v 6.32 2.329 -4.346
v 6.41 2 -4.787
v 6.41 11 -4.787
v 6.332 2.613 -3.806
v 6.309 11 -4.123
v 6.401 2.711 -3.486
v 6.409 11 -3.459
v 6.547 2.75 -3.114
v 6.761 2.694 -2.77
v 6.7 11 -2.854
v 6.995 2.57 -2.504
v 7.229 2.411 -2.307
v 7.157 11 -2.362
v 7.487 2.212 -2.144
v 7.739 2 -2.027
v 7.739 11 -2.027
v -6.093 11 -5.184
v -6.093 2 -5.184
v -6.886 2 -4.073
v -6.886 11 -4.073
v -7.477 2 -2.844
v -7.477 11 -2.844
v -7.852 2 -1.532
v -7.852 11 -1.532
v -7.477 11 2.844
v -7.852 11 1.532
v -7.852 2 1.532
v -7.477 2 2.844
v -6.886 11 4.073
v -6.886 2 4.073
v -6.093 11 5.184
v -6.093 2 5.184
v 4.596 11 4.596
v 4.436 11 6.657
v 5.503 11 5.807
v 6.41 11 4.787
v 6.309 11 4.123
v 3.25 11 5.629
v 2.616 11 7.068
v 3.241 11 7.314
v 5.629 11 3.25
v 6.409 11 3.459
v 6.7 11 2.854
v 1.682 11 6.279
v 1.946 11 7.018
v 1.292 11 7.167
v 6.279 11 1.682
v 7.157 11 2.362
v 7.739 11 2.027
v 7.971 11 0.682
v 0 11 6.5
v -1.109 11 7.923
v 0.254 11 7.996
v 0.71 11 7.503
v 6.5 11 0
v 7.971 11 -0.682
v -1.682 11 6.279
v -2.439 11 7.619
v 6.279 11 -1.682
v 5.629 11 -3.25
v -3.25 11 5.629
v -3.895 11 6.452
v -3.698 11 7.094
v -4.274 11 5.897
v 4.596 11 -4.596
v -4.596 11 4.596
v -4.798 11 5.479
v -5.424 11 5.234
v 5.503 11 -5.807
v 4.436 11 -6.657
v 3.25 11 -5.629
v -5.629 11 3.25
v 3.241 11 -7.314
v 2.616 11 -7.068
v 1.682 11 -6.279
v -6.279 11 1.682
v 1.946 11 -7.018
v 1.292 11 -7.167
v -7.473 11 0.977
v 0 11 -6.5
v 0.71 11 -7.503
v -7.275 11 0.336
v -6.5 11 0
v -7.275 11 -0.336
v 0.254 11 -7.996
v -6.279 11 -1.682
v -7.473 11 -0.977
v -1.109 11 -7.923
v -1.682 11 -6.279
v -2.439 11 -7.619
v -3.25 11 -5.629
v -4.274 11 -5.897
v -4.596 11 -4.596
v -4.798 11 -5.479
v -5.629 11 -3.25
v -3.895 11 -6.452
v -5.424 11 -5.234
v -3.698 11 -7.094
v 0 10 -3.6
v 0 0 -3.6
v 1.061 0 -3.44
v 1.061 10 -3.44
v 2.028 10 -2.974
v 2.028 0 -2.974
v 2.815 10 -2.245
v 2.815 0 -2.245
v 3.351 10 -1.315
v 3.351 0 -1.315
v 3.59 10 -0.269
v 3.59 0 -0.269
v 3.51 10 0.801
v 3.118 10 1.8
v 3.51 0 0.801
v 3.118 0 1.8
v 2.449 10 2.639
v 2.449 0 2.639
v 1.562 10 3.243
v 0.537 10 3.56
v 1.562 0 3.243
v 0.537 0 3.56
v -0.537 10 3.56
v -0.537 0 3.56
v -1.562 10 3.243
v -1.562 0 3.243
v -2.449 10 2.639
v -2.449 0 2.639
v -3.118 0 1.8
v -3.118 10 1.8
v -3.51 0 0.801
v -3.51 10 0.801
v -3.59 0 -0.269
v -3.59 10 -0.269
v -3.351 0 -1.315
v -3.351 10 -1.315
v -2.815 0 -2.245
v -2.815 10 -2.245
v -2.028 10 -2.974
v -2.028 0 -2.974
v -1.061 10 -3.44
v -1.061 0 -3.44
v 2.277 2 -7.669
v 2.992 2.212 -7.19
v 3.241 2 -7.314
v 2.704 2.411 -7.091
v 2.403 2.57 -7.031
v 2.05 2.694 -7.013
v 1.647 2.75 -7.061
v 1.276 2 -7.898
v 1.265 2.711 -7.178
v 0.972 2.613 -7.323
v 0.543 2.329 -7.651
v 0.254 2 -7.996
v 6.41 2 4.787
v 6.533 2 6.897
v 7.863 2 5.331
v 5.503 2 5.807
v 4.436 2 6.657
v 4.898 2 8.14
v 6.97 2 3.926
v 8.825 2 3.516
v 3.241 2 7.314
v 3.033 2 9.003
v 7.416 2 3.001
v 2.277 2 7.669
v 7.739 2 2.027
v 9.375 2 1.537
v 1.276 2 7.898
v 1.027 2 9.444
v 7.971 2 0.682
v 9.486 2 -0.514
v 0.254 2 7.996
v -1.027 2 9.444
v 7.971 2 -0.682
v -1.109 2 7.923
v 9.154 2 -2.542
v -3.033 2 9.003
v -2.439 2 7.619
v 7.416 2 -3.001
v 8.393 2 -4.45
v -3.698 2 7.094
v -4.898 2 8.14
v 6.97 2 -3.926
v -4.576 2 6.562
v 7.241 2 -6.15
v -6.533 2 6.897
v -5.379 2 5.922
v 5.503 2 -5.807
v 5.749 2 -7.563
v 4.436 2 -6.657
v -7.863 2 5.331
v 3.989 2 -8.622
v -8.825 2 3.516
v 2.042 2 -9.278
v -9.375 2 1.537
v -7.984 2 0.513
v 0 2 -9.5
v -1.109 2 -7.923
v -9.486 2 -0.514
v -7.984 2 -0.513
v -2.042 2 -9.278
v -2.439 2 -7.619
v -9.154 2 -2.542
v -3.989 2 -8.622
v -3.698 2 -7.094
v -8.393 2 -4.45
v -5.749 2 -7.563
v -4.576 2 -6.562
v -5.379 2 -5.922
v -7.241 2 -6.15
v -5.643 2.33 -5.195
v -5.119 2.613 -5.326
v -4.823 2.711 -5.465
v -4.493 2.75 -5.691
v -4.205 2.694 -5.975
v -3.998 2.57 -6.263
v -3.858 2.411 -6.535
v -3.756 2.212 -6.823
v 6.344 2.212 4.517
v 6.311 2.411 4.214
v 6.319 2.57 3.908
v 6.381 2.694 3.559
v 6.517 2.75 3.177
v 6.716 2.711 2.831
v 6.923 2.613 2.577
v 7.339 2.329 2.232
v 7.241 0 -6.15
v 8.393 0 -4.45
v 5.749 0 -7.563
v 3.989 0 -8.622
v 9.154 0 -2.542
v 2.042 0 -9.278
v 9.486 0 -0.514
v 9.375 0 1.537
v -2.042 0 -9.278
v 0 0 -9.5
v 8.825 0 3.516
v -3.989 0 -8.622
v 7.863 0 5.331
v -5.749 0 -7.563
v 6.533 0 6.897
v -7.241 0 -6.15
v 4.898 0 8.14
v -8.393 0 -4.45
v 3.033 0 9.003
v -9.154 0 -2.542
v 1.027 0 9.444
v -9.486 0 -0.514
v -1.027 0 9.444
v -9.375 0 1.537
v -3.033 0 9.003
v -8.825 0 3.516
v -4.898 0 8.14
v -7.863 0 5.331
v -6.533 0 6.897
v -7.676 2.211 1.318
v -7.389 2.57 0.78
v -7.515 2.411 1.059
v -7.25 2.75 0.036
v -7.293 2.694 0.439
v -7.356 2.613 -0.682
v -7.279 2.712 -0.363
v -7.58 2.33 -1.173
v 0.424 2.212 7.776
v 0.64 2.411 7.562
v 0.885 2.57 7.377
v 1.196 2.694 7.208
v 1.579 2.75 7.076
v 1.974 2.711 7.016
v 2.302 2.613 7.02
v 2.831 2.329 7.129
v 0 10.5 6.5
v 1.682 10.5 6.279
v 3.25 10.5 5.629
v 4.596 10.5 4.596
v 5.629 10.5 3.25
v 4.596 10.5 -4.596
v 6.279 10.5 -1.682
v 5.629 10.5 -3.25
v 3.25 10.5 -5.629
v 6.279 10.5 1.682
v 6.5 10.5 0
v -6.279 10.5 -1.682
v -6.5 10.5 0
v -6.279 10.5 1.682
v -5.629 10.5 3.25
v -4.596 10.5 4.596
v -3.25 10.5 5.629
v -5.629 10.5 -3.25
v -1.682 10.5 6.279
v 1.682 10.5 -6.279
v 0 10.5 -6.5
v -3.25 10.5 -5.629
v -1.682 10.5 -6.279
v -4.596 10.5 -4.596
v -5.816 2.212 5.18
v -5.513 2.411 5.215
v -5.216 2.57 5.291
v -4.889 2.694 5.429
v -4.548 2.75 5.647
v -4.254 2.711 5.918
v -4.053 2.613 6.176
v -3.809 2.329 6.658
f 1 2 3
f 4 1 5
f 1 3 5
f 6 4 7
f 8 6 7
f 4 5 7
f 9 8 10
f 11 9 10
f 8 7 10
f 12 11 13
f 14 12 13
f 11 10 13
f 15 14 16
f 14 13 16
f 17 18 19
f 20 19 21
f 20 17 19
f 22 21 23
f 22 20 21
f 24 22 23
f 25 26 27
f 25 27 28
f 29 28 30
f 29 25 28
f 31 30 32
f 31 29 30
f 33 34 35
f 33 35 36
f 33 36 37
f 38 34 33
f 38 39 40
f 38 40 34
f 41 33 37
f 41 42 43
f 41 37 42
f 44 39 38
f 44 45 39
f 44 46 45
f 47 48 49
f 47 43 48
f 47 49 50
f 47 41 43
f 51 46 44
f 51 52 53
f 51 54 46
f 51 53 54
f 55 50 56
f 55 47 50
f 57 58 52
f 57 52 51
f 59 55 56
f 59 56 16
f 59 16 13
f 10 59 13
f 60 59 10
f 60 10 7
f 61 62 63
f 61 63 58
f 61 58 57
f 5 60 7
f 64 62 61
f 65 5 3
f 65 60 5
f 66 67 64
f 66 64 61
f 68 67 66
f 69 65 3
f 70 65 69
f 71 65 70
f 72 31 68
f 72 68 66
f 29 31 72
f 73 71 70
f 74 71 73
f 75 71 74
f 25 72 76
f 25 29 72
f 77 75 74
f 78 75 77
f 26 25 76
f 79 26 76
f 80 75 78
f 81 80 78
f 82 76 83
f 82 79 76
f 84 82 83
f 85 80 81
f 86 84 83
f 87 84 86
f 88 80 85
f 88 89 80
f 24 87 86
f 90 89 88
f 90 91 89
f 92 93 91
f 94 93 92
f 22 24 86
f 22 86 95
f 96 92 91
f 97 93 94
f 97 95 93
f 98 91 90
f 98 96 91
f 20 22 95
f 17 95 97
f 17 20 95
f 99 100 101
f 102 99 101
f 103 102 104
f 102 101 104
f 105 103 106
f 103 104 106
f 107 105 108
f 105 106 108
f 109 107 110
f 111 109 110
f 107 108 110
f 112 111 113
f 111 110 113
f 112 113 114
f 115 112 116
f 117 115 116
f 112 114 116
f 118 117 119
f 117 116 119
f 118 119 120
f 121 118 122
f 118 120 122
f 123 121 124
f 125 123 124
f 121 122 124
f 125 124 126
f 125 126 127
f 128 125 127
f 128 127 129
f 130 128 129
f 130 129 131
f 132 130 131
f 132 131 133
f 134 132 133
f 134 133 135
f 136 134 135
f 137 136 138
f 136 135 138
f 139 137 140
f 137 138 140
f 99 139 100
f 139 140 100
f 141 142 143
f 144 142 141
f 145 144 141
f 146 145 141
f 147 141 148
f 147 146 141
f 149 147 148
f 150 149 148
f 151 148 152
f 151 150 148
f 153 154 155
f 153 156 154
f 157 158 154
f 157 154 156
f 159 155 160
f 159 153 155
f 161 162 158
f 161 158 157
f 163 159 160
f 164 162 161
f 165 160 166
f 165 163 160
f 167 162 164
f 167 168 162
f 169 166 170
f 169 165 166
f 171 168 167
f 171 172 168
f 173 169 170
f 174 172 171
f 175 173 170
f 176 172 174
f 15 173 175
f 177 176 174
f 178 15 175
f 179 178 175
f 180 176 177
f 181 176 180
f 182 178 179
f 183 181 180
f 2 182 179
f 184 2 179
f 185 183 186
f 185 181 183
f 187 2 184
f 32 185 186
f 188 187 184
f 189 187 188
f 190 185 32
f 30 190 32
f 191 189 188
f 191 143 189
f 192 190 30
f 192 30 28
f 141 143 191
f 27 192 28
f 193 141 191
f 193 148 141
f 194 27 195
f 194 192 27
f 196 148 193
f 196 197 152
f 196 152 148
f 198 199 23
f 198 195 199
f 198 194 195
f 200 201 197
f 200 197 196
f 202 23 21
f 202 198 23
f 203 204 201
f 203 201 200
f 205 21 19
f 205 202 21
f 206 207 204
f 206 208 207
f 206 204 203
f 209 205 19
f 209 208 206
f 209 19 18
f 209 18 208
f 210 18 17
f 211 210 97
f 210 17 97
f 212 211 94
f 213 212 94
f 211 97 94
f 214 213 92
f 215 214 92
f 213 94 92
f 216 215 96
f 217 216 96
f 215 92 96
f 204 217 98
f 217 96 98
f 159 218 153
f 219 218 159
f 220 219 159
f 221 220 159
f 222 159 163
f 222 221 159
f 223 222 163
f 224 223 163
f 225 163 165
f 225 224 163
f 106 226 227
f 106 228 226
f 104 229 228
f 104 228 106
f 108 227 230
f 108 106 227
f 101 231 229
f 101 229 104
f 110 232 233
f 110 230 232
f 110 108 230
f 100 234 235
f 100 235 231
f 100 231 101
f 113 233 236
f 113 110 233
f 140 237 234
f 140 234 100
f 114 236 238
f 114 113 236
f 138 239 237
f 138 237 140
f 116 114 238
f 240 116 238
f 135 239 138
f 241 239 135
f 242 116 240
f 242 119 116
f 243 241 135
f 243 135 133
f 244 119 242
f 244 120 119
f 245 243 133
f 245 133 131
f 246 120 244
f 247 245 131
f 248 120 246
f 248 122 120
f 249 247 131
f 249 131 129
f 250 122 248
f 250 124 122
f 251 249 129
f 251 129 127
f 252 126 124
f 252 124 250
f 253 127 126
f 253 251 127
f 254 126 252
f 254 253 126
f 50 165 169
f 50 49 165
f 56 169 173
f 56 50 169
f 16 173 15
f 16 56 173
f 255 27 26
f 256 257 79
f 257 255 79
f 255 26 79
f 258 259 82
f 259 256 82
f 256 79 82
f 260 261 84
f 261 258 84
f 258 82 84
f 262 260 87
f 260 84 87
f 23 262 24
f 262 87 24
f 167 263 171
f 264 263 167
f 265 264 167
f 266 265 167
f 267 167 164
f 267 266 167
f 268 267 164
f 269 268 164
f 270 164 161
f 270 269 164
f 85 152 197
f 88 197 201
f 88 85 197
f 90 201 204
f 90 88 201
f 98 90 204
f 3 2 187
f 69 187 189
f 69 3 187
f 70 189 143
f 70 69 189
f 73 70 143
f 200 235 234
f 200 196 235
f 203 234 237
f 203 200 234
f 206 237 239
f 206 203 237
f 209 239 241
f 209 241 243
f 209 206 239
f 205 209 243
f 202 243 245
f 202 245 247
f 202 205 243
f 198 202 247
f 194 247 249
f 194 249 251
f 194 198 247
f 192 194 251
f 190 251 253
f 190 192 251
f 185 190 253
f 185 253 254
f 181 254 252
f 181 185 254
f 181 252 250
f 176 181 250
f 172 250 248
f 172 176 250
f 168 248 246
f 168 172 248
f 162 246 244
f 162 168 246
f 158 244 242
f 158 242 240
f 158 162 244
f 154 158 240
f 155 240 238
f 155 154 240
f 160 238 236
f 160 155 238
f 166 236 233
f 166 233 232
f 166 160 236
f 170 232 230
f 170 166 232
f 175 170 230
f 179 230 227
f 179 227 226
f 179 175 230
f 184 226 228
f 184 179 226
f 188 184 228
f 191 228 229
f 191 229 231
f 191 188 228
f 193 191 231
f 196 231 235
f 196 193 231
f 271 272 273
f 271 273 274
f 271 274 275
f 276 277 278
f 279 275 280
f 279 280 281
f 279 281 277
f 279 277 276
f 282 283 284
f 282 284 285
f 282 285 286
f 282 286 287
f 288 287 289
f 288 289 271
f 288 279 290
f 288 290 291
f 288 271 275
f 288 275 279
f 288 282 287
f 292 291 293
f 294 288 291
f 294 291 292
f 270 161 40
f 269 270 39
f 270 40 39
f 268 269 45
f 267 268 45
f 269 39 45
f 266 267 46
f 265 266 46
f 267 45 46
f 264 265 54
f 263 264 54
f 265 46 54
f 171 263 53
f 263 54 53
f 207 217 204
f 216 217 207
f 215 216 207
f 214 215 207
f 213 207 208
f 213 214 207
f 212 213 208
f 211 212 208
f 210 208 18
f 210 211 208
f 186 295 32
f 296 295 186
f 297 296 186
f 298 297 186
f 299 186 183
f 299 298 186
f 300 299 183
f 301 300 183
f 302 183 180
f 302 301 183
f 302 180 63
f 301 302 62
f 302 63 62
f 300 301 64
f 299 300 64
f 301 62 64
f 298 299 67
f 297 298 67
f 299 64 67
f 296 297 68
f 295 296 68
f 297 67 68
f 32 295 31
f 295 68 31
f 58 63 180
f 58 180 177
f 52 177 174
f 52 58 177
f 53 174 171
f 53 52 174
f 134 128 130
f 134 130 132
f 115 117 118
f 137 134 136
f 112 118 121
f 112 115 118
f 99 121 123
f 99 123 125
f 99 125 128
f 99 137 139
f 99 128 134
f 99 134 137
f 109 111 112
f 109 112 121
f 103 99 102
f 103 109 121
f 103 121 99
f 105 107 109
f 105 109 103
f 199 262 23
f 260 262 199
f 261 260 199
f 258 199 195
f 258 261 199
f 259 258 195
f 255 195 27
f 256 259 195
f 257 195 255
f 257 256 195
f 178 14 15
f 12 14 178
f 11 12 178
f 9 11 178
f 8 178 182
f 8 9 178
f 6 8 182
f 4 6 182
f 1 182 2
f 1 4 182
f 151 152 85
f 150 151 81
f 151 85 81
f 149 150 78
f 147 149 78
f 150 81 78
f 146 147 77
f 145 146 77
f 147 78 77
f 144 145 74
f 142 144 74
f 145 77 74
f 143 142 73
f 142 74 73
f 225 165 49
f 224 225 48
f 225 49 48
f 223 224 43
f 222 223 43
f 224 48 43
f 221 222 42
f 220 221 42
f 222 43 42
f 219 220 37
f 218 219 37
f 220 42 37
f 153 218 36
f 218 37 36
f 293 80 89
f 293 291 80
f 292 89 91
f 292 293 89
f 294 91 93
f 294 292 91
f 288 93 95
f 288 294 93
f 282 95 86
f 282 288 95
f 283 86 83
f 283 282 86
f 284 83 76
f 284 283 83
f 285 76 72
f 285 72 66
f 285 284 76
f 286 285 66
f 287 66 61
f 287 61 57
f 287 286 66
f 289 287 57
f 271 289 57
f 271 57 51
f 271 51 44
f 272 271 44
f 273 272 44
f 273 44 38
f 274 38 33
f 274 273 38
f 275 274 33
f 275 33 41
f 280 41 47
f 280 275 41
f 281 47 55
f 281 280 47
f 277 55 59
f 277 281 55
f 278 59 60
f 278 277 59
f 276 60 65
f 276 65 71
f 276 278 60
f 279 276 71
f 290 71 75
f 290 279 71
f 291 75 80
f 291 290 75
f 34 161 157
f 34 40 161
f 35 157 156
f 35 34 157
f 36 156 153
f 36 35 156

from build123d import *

# Parameters (mm, degrees)
SKETCH2_R          = 3.6
CUT_EXTRUDE1_DEPTH = 10
SKETCH3_R          = 2.25
CUT_EXTRUDE2_DEPTH = 7.5
CHAMFER1_SIZE      = 1.5


with BuildPart() as part:
    # Sketch1 → Revolve1 (revolve)
    with BuildSketch(Plane(origin=(0, 0, 0), x_dir=(0, 0, -1), z_dir=(1, 0, 0)), mode=Mode.PRIVATE) as revolve1_sk:
        Polygon((0, 0), (-9.5, 0), (-9.5, 2), (-8, 2), (-8, 11), (-6.5, 11), (-6.5, 10.5), (0, 10.5), align=None)
    revolve(revolve1_sk.sketch.rotate(Axis((0, 0, 0), (0, 1, 0)), 180), axis=Axis((0, 0, 0), (0, 1, 0)))

    # Sketch2 → Cut-Extrude1 (cut)
    with BuildSketch(Plane.XZ):
        with Locations(Location((0, 0, 0), (0, 0, 270))):
            Circle(SKETCH2_R)
    extrude(amount=-CUT_EXTRUDE1_DEPTH, mode=Mode.SUBTRACT)

    # Sketch3 → Cut-Extrude2 (cut)
    with BuildSketch(Plane(origin=(0, 11, 0), x_dir=(1, 0, 0), z_dir=(0, 1, 0))):
        with Locations((-9.5, 0)):
            Circle(SKETCH3_R)
        with Locations((-5.923153118, 7.427399083)):
            Circle(SKETCH3_R)
        with Locations((2.113948873, 9.261815166)):
            Circle(SKETCH3_R)
        with Locations((8.559204245, 4.121895522)):
            Circle(SKETCH3_R)
        with Locations((8.559204245, -4.121895522)):
            Circle(SKETCH3_R)
        with Locations((2.113948873, -9.261815166)):
            Circle(SKETCH3_R)
        with Locations((-5.923153118, -7.427399083)):
            Circle(SKETCH3_R)
    extrude(amount=-CUT_EXTRUDE2_DEPTH, mode=Mode.SUBTRACT)

    # Chamfer1
    # the kernel refuses this chamfer: 1.5 mm, written as the material it takes off along each edge
    with BuildSketch(Plane(origin=(0, 3.5, 0), x_dir=(-0.43539008787732036, 0, 0.9002418960358263), z_dir=(-0.9002418960358263, 0, -0.43539008787732036))) as chamfer1_piece_1_section:
        Polygon((8, -CHAMFER1_SIZE), (8 - CHAMFER1_SIZE, 0), (8, 0), align=None)
    chamfer1_piece_1 = revolve(axis=Axis((0, 3.5, 0), (0, 1, 0)), revolution_arc=77.334522456, mode=Mode.PRIVATE)
    chamfer1_piece_1 = split(chamfer1_piece_1, bisect_by=Plane(origin=(1.717555098, 2, 7.525103296), z_dir=(0, 1, 0)), keep=Keep.TOP, mode=Mode.PRIVATE)
    chamfer1_piece_1 = chamfer1_piece_1 & Plane(origin=(2.113948873, 2.875825312, 9.261815166), x_dir=(1, 0, 0), z_dir=(0, 1, 0)) * Cylinder(2.25, 33, mode=Mode.PRIVATE)
    add(chamfer1_piece_1, mode=Mode.SUBTRACT)
    with BuildSketch(Plane(origin=(0, 3.5, 0), x_dir=(-0.975298735779407, 0, 0.2208899635272972), z_dir=(-0.2208899635272972, 0, -0.975298735779407))) as chamfer1_piece_2_section:
        Polygon((8, -CHAMFER1_SIZE), (8 - CHAMFER1_SIZE, 0), (8, 0), align=None)
    chamfer1_piece_2 = revolve(axis=Axis((0, 3.5, 0), (0, 1, 0)), revolution_arc=77.334522456, mode=Mode.PRIVATE)
    chamfer1_piece_2 = split(chamfer1_piece_2, bisect_by=Plane(origin=(-4.812484572, 2, 6.034663839), z_dir=(0, 1, 0)), keep=Keep.TOP, mode=Mode.PRIVATE)
    chamfer1_piece_2 = chamfer1_piece_2 & Plane(origin=(-5.923153118, 2.875825413, 7.427399083), x_dir=(1, 0, 0), z_dir=(0, 1, 0)) * Cylinder(2.25, 32, mode=Mode.PRIVATE)
    add(chamfer1_piece_2, mode=Mode.SUBTRACT)
    with BuildSketch(Plane(origin=(0, 3.5, 0), x_dir=(-0.7807875431710312, 0, -0.624796616851392), z_dir=(0.624796616851392, 0, -0.7807875431710312))) as chamfer1_piece_3_section:
        Polygon((8, -CHAMFER1_SIZE), (8 - CHAMFER1_SIZE, 0), (8, 0), align=None)
    chamfer1_piece_3 = revolve(axis=Axis((0, 3.5, 0), (0, 1, 0)), revolution_arc=77.334522456, mode=Mode.PRIVATE)
    chamfer1_piece_3 = split(chamfer1_piece_3, bisect_by=Plane(origin=(-7.718624937, 2, -1.33e-07), z_dir=(0, 1, 0)), keep=Keep.TOP, mode=Mode.PRIVATE)
    chamfer1_piece_3 = chamfer1_piece_3 & Plane(origin=(-9.5, 2.875824947, 0), x_dir=(1, 0, 0), z_dir=(0, 1, 0)) * Cylinder(2.25, 32, mode=Mode.PRIVATE)
    add(chamfer1_piece_3, mode=Mode.SUBTRACT)
    with BuildSketch(Plane(origin=(0, 3.5, 0), x_dir=(0.0016725946084597224, 0, -0.9999986012126596), z_dir=(0.9999986012126596, 0, 0.0016725946084597224))) as chamfer1_piece_4_section:
        Polygon((8, -CHAMFER1_SIZE), (8 - CHAMFER1_SIZE, 0), (8, 0), align=None)
    chamfer1_piece_4 = revolve(axis=Axis((0, 3.5, 0), (0, 1, 0)), revolution_arc=77.334522456, mode=Mode.PRIVATE)
    chamfer1_piece_4 = split(chamfer1_piece_4, bisect_by=Plane(origin=(-4.81248369, 2, -6.034664462), z_dir=(0, 1, 0)), keep=Keep.TOP, mode=Mode.PRIVATE)
    chamfer1_piece_4 = chamfer1_piece_4 & Plane(origin=(-5.923153118, 2.875825391, -7.427399083), x_dir=(1, 0, 0), z_dir=(0, 1, 0)) * Cylinder(2.25, 32, mode=Mode.PRIVATE)
    add(chamfer1_piece_4, mode=Mode.SUBTRACT)
    with BuildSketch(Plane(origin=(0, 3.5, 0), x_dir=(0.782873234533069, 0, -0.6221812426067909), z_dir=(0.6221812426067909, 0, 0.782873234533069))) as chamfer1_piece_5_section:
        Polygon((8, -CHAMFER1_SIZE), (8 - CHAMFER1_SIZE, 0), (8, 0), align=None)
    chamfer1_piece_5 = revolve(axis=Axis((0, 3.5, 0), (0, 1, 0)), revolution_arc=77.334522456, mode=Mode.PRIVATE)
    chamfer1_piece_5 = split(chamfer1_piece_5, bisect_by=Plane(origin=(1.717556284, 2, -7.525103041), z_dir=(0, 1, 0)), keep=Keep.TOP, mode=Mode.PRIVATE)
    chamfer1_piece_5 = chamfer1_piece_5 & Plane(origin=(2.113948873, 2.875825447, -9.261815166), x_dir=(1, 0, 0), z_dir=(0, 1, 0)) * Cylinder(2.25, 32, mode=Mode.PRIVATE)
    add(chamfer1_piece_5, mode=Mode.SUBTRACT)
    with BuildSketch(Plane(origin=(0, 3.5, 0), x_dir=(0.9745543611505972, 0, 0.22415128186640224), z_dir=(-0.22415128186640224, 0, 0.9745543611505972))) as chamfer1_piece_6_section:
        Polygon((8, -CHAMFER1_SIZE), (8 - CHAMFER1_SIZE, 0), (8, 0), align=None)
    chamfer1_piece_6 = revolve(axis=Axis((0, 3.5, 0), (0, 1, 0)), revolution_arc=77.334522456, mode=Mode.PRIVATE)
    chamfer1_piece_6 = split(chamfer1_piece_6, bisect_by=Plane(origin=(6.9542413, 2, -3.34898542), z_dir=(0, 1, 0)), keep=Keep.TOP, mode=Mode.PRIVATE)
    chamfer1_piece_6 = chamfer1_piece_6 & Plane(origin=(8.559204245, 2.875825426, -4.121895522), x_dir=(1, 0, 0), z_dir=(0, 1, 0)) * Cylinder(2.25, 32, mode=Mode.PRIVATE)
    add(chamfer1_piece_6, mode=Mode.SUBTRACT)
    with BuildSketch(Plane(origin=(0, 3.5, 0), x_dir=(0.43237617653563165, 0, 0.9016933192413196), z_dir=(-0.9016933192413196, 0, 0.43237617653563165))) as chamfer1_piece_7_section:
        Polygon((8, -CHAMFER1_SIZE), (8 - CHAMFER1_SIZE, 0), (8, 0), align=None)
    chamfer1_piece_7 = revolve(axis=Axis((0, 3.5, 0), (0, 1, 0)), revolution_arc=77.334522456, mode=Mode.PRIVATE)
    chamfer1_piece_7 = split(chamfer1_piece_7, bisect_by=Plane(origin=(6.954240779, 2, 3.348986578), z_dir=(0, 1, 0)), keep=Keep.TOP, mode=Mode.PRIVATE)
    chamfer1_piece_7 = chamfer1_piece_7 & Plane(origin=(8.559204245, 2.875825449, 4.121895522), x_dir=(1, 0, 0), z_dir=(0, 1, 0)) * Cylinder(2.25, 32, mode=Mode.PRIVATE)
    add(chamfer1_piece_7, mode=Mode.SUBTRACT)


solid = part.part
